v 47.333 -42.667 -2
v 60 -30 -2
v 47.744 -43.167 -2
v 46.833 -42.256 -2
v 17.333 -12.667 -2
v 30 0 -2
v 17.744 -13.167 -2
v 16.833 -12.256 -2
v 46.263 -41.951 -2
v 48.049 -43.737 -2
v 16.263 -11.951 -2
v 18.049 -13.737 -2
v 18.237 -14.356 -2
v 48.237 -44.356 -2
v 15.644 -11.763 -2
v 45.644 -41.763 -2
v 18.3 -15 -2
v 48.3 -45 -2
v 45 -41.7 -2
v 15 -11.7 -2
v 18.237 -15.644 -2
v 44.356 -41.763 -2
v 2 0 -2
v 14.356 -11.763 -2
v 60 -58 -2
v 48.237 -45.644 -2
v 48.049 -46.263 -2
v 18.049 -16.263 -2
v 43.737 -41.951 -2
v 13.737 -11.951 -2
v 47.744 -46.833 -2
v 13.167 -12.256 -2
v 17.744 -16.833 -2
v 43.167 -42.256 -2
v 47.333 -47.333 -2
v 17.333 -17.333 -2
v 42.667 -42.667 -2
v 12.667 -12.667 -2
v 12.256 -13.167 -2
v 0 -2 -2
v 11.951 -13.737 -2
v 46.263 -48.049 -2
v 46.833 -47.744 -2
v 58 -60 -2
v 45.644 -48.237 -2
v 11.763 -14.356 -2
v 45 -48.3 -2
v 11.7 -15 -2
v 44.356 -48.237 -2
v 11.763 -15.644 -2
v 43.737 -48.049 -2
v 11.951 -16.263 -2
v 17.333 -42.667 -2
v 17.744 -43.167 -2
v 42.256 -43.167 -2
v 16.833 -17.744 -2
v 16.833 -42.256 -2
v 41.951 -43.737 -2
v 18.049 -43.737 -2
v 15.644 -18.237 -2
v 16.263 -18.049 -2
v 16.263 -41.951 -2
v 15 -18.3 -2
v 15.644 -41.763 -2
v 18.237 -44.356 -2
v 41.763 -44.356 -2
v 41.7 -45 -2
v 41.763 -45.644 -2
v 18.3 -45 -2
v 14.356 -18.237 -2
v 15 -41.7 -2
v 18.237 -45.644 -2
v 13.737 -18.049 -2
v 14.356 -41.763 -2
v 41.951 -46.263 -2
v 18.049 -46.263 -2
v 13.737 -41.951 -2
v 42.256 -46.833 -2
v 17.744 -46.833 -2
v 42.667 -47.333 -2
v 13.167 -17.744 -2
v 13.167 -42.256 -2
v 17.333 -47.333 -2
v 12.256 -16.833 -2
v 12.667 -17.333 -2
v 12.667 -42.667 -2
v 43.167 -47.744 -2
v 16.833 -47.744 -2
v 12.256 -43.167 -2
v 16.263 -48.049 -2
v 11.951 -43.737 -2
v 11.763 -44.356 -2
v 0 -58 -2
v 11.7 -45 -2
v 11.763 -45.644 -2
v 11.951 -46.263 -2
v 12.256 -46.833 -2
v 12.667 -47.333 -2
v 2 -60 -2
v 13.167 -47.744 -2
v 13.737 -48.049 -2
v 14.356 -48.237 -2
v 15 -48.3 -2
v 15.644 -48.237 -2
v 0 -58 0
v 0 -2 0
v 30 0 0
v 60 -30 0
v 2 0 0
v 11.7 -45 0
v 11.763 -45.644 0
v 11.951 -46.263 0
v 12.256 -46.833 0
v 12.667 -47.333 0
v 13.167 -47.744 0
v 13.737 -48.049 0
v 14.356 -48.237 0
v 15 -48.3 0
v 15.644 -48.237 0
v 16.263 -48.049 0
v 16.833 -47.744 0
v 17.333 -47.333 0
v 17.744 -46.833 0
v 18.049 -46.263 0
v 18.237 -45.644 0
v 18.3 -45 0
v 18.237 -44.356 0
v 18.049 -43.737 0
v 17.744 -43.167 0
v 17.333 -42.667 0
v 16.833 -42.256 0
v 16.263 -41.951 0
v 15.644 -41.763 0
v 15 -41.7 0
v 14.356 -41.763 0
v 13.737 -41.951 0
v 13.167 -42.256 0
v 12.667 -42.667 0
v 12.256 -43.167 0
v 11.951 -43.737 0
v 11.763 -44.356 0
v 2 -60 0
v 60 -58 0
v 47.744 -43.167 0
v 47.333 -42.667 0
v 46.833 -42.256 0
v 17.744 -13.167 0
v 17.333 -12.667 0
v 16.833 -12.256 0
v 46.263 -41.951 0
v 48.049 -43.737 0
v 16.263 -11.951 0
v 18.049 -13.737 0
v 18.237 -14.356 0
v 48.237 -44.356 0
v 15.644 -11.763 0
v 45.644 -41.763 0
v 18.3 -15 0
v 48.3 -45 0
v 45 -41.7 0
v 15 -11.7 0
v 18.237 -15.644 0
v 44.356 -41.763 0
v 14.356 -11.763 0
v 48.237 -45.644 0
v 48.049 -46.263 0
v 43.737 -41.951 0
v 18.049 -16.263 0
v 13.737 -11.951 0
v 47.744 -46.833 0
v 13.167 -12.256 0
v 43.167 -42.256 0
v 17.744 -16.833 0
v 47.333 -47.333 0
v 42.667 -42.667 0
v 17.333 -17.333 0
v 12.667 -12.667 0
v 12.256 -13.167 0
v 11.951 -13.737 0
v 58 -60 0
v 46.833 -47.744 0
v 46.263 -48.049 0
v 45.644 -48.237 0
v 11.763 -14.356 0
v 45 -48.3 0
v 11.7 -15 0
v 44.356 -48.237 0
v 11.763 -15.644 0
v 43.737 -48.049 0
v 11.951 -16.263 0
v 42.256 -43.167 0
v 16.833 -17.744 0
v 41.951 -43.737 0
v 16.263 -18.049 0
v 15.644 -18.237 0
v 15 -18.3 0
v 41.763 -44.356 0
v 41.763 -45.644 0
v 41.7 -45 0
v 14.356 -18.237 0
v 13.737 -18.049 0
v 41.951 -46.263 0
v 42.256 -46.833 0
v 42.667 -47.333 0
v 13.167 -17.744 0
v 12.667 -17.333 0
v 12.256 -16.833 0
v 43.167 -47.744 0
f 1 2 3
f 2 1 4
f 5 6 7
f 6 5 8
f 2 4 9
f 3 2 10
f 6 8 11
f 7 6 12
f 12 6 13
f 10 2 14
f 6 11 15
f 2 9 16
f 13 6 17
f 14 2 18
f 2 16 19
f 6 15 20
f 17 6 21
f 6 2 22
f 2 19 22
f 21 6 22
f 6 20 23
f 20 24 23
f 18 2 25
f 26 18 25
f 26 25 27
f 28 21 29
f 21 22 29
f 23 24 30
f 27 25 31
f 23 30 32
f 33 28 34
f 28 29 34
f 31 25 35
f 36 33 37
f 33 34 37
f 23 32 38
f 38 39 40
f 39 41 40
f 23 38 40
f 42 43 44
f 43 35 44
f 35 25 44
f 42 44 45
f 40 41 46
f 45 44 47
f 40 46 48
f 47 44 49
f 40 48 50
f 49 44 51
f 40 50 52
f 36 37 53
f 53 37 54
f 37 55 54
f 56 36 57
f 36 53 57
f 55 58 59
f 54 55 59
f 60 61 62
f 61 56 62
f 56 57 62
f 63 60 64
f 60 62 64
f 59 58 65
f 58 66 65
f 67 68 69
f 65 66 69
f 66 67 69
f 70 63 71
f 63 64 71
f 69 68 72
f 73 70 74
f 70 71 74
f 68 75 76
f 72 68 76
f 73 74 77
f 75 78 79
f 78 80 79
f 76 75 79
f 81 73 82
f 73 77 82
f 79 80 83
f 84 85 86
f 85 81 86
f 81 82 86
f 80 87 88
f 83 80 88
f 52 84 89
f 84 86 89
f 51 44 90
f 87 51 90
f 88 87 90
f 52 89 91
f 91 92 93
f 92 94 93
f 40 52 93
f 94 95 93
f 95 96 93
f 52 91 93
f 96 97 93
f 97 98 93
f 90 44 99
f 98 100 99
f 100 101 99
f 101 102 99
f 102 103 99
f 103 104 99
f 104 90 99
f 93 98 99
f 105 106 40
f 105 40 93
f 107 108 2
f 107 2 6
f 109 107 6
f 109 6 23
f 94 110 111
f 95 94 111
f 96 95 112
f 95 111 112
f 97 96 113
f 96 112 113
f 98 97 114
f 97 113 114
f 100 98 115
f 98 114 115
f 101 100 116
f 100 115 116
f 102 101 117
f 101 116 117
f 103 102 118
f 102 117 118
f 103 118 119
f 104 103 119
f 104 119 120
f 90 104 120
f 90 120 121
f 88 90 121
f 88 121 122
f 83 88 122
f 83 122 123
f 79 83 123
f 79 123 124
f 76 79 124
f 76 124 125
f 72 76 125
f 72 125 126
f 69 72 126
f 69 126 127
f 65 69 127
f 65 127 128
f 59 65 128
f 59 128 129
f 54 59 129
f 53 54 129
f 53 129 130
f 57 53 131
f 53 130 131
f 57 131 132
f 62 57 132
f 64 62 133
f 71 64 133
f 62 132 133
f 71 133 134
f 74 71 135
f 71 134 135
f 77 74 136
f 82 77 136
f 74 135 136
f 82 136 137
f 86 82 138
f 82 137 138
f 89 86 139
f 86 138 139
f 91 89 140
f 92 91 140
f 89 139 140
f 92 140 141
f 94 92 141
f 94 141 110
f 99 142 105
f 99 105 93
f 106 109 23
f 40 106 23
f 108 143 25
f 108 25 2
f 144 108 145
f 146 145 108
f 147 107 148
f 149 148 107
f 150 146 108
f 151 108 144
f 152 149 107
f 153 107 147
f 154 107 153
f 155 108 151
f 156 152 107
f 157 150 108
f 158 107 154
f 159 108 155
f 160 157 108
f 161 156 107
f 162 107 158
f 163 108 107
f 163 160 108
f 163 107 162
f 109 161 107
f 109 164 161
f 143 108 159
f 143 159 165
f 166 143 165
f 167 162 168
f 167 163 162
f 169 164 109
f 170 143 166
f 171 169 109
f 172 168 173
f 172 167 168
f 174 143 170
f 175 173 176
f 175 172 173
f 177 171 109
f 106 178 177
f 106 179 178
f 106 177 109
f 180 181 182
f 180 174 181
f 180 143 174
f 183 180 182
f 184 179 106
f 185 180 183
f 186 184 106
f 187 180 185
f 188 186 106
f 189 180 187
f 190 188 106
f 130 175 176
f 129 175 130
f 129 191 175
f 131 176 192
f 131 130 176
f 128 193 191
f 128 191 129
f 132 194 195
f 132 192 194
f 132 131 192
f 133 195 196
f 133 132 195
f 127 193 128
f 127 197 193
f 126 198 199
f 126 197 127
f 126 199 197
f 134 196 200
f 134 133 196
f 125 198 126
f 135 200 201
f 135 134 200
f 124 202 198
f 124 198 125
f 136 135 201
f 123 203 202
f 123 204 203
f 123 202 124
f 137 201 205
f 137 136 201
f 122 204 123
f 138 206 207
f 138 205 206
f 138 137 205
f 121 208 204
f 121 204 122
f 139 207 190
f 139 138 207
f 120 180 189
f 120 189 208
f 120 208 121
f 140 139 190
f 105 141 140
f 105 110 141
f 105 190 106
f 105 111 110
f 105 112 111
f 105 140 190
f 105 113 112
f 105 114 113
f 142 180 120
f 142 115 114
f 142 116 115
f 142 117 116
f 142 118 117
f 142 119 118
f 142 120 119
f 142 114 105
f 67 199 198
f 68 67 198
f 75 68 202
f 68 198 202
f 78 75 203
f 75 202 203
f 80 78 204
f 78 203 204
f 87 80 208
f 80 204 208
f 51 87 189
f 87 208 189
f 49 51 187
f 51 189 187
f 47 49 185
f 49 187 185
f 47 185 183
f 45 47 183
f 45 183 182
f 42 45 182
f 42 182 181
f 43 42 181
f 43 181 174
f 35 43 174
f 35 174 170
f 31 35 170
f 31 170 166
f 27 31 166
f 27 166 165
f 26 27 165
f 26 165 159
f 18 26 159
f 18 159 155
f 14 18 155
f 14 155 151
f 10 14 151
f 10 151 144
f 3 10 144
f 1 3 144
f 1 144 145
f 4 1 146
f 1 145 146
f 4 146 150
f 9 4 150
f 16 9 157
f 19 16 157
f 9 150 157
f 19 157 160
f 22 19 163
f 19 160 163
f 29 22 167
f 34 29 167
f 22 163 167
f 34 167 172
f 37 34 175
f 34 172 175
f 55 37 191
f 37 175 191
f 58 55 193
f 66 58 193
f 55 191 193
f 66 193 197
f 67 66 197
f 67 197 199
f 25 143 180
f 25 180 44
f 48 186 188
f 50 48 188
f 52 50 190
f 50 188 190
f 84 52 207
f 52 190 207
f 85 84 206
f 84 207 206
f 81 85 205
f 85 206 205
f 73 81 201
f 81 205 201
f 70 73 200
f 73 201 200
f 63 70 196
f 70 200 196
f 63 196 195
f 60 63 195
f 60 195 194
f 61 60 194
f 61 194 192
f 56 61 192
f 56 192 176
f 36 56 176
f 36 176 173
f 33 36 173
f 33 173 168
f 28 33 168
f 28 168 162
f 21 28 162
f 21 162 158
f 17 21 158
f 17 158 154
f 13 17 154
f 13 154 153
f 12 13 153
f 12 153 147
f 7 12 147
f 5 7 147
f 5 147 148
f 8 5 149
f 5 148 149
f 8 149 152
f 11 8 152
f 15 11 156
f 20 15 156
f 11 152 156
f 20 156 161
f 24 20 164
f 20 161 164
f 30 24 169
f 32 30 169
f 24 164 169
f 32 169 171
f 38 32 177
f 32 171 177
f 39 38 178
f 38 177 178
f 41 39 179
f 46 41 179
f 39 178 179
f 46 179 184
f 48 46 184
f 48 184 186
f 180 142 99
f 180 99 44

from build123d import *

# Parameters (mm, degrees)
EXTRUDE_1_DEPTH   = 2
HOLE_WIZARD_M61_D = 6.6
CHAMFER_1_SIZE    = 2


with BuildPart() as part:
    # Эскиз1 → Бобышка-Вытянуть1 (new body)
    with BuildSketch(Plane(origin=(0, 0, 0), x_dir=(1, 0, 0), z_dir=(0, 0, -1))):
        Polygon((0, 0), (0, 60), (60, 60), (60, 30), (30, 0), align=None)
    extrude(amount=EXTRUDE_1_DEPTH)

    # Отверстие с зазором M61 (through all)
    with Locations(Plane(origin=(0, 0, -2), x_dir=(1, 0, 0), z_dir=(0, 0, -1))):
        with Locations((15, 45), (15, 15), (45, 45)):
            Hole(HOLE_WIZARD_M61_D / 2)

    # Фаска1
    chamfer_1_edges = [part.edges().sort_by_distance(p)[0] for p in [
        (0, 0, -1),
        (0, -60, -1),
        (60, -60, -1),
    ]]
    chamfer(chamfer_1_edges, length=CHAMFER_1_SIZE)


solid = part.part
